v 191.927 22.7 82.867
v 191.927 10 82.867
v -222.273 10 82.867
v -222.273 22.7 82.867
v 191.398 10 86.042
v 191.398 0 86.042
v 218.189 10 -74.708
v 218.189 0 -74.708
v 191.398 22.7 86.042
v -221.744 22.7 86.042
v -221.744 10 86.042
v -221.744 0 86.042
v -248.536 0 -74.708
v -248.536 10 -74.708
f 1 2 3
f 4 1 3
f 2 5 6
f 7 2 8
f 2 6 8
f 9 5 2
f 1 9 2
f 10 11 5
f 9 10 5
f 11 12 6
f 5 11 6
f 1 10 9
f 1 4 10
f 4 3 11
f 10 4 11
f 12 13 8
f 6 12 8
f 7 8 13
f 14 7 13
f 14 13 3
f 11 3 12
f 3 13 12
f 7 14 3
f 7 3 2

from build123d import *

# Parameters (mm, degrees)
BOSS_EXTRUDE1_DEPTH = 10
BOSS_EXTRUDE2_DEPTH = 12.7


with BuildPart() as part:
    # Sketch1 → Boss-Extrude1 (new body)
    with BuildSketch(Plane(origin=(0, 0, 0), x_dir=(1, 0, 0), z_dir=(0, 1, 0))):
        Polygon((-248.535594609, 74.707564465), (-221.743927942, -86.042435535), (191.397738725, -86.042435535), (218.189405391, 74.707564465), align=None)
    extrude(amount=BOSS_EXTRUDE1_DEPTH)

    # Sketch2 → Boss-Extrude2 (add)
    with BuildSketch(Plane(origin=(0, 10, 0), x_dir=(1, 0, 0), z_dir=(0, 1, 0))):
        Polygon((-221.743927942, -86.042435535), (191.397738725, -86.042435535), (191.926905391, -82.867435535), (-222.273094609, -82.867435535), align=None)
    extrude(amount=BOSS_EXTRUDE2_DEPTH)


solid = part.part
